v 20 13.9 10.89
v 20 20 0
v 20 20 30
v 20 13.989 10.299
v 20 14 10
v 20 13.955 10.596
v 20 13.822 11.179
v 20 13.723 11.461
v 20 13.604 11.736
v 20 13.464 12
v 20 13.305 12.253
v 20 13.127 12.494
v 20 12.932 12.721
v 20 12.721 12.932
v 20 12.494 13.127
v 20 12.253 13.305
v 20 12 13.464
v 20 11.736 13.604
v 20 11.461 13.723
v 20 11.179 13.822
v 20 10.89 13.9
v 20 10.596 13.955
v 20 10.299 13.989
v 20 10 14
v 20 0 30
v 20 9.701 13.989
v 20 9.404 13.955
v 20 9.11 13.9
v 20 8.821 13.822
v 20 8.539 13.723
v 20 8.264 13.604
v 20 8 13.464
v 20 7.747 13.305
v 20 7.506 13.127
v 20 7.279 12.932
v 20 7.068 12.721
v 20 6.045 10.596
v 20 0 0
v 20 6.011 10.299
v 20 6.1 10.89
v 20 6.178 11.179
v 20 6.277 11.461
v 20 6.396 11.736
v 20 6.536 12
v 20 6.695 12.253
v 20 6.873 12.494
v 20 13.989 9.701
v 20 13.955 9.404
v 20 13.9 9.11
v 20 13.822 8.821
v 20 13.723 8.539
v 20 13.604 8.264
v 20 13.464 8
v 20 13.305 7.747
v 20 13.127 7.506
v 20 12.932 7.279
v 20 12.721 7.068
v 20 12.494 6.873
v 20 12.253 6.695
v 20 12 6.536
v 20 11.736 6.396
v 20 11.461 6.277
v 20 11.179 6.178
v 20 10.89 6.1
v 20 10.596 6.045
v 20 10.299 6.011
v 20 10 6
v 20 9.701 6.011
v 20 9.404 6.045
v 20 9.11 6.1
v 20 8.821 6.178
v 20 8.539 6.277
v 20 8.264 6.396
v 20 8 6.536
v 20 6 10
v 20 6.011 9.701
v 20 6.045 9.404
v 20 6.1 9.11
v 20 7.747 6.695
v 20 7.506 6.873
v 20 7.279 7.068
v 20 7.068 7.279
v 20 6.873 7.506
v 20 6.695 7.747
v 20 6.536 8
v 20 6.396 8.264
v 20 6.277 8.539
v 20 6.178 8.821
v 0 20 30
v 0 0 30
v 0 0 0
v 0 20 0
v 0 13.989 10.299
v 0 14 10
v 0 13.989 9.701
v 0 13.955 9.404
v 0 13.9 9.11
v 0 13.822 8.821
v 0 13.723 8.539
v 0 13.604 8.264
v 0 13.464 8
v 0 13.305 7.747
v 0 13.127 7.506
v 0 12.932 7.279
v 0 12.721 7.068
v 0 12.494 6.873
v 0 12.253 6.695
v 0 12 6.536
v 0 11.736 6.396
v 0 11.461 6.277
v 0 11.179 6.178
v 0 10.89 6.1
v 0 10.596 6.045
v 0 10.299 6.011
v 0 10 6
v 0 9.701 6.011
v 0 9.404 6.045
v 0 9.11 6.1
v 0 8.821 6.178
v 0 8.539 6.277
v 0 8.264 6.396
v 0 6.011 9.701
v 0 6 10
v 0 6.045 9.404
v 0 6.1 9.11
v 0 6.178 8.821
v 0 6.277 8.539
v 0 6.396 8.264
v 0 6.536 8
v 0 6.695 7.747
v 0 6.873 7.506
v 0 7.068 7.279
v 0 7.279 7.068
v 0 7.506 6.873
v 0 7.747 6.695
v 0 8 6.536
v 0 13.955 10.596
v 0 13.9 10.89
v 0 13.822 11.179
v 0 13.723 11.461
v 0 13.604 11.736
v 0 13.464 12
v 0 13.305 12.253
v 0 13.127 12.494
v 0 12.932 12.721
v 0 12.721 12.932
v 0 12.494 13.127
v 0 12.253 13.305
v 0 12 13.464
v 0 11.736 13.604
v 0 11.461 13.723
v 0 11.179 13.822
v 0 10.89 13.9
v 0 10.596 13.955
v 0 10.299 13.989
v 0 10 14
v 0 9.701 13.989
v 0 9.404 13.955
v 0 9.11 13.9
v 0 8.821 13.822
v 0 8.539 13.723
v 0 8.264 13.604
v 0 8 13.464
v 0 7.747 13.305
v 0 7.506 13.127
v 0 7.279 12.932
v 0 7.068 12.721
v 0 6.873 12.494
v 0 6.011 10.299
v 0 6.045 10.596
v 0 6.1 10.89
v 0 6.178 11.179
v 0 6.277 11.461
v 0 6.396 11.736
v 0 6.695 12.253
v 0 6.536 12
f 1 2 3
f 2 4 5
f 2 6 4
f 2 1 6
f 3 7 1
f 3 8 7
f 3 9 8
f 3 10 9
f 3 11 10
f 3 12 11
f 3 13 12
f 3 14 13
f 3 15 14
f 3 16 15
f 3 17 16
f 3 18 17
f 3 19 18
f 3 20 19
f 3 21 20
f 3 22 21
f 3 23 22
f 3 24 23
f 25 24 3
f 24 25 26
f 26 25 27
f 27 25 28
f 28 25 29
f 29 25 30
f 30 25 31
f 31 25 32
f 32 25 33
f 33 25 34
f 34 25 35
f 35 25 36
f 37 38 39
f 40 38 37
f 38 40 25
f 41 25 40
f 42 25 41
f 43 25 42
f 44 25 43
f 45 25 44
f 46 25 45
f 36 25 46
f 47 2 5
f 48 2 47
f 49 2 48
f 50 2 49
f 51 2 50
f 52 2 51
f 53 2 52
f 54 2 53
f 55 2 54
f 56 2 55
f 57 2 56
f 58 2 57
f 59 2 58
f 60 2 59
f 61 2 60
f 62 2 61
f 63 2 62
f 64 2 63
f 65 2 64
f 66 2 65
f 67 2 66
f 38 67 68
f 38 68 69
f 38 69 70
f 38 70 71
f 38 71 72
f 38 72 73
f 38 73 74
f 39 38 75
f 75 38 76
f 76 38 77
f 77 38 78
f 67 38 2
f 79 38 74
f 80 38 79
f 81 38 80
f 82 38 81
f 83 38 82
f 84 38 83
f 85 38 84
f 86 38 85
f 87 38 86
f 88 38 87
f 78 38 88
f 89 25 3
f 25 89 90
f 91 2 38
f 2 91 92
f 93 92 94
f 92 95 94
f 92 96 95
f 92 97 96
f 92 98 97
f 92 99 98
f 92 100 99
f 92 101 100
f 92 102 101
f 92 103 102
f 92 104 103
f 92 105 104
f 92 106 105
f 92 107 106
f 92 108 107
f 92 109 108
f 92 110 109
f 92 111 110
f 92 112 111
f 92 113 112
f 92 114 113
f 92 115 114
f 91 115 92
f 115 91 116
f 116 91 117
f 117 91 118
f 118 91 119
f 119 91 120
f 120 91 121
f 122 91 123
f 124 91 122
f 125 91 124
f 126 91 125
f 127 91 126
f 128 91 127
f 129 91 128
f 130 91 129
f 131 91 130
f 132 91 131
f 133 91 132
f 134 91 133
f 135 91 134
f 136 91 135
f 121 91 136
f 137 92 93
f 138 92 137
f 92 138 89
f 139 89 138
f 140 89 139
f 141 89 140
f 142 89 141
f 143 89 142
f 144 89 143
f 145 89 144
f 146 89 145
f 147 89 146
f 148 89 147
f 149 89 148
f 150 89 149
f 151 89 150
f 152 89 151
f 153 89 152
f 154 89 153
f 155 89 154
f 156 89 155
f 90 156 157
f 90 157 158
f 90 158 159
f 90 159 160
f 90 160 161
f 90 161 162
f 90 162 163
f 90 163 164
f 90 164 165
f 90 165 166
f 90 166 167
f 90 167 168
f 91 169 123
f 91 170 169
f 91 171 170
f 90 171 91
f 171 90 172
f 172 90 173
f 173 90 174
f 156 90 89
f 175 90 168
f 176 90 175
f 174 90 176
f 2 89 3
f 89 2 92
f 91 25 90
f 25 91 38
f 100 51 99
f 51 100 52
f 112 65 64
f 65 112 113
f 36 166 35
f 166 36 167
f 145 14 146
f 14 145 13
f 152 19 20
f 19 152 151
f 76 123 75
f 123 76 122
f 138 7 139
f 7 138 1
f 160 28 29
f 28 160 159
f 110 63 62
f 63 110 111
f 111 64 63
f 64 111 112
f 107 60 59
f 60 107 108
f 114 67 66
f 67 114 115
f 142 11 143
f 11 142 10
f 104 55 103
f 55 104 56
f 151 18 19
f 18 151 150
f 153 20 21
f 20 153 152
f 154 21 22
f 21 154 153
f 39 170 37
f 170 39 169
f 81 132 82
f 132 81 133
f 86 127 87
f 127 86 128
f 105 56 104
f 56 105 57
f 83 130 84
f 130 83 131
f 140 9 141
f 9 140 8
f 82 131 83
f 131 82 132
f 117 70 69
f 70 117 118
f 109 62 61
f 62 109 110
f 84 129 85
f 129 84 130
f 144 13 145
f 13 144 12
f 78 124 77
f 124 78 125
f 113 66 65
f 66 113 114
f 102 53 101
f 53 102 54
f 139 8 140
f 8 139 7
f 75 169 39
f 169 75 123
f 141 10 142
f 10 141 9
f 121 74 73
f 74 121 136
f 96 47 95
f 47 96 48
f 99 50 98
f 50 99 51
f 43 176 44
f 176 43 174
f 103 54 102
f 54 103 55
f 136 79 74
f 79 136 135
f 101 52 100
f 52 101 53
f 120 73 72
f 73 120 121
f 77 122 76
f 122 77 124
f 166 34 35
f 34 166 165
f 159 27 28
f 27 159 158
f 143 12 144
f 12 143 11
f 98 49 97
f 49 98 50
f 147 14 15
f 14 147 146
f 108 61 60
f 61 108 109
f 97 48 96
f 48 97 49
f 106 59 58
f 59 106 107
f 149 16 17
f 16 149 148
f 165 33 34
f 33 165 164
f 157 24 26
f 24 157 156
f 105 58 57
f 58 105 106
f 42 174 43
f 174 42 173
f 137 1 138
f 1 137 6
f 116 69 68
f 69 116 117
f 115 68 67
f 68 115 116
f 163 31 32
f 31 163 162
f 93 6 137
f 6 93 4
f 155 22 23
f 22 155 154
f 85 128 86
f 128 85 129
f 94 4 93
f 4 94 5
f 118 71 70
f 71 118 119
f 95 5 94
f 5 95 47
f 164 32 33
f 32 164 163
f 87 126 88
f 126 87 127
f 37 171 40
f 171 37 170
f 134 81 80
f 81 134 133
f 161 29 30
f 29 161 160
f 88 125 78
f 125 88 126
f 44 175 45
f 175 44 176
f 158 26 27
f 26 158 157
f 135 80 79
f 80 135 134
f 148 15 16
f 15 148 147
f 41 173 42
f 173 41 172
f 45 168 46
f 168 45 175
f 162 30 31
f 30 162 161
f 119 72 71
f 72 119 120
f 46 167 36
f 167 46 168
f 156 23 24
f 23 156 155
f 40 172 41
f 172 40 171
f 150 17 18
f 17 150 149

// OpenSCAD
// The correct version of bore_reachability_sealed_fail: the bore passes all the
// way through the tower, so the declared path from outside to the seat is clear.

$fa = 2; $fs = 0.3;

// EXPECTED_BBOX: [20, 20, 30]

difference() {
    cube([20, 20, 30]);
    // bore spans x = -20 .. 40 -- through both faces
    translate([10, 10, 10]) rotate([0, 90, 0]) cylinder(d = 8, h = 60, center = true);
}
